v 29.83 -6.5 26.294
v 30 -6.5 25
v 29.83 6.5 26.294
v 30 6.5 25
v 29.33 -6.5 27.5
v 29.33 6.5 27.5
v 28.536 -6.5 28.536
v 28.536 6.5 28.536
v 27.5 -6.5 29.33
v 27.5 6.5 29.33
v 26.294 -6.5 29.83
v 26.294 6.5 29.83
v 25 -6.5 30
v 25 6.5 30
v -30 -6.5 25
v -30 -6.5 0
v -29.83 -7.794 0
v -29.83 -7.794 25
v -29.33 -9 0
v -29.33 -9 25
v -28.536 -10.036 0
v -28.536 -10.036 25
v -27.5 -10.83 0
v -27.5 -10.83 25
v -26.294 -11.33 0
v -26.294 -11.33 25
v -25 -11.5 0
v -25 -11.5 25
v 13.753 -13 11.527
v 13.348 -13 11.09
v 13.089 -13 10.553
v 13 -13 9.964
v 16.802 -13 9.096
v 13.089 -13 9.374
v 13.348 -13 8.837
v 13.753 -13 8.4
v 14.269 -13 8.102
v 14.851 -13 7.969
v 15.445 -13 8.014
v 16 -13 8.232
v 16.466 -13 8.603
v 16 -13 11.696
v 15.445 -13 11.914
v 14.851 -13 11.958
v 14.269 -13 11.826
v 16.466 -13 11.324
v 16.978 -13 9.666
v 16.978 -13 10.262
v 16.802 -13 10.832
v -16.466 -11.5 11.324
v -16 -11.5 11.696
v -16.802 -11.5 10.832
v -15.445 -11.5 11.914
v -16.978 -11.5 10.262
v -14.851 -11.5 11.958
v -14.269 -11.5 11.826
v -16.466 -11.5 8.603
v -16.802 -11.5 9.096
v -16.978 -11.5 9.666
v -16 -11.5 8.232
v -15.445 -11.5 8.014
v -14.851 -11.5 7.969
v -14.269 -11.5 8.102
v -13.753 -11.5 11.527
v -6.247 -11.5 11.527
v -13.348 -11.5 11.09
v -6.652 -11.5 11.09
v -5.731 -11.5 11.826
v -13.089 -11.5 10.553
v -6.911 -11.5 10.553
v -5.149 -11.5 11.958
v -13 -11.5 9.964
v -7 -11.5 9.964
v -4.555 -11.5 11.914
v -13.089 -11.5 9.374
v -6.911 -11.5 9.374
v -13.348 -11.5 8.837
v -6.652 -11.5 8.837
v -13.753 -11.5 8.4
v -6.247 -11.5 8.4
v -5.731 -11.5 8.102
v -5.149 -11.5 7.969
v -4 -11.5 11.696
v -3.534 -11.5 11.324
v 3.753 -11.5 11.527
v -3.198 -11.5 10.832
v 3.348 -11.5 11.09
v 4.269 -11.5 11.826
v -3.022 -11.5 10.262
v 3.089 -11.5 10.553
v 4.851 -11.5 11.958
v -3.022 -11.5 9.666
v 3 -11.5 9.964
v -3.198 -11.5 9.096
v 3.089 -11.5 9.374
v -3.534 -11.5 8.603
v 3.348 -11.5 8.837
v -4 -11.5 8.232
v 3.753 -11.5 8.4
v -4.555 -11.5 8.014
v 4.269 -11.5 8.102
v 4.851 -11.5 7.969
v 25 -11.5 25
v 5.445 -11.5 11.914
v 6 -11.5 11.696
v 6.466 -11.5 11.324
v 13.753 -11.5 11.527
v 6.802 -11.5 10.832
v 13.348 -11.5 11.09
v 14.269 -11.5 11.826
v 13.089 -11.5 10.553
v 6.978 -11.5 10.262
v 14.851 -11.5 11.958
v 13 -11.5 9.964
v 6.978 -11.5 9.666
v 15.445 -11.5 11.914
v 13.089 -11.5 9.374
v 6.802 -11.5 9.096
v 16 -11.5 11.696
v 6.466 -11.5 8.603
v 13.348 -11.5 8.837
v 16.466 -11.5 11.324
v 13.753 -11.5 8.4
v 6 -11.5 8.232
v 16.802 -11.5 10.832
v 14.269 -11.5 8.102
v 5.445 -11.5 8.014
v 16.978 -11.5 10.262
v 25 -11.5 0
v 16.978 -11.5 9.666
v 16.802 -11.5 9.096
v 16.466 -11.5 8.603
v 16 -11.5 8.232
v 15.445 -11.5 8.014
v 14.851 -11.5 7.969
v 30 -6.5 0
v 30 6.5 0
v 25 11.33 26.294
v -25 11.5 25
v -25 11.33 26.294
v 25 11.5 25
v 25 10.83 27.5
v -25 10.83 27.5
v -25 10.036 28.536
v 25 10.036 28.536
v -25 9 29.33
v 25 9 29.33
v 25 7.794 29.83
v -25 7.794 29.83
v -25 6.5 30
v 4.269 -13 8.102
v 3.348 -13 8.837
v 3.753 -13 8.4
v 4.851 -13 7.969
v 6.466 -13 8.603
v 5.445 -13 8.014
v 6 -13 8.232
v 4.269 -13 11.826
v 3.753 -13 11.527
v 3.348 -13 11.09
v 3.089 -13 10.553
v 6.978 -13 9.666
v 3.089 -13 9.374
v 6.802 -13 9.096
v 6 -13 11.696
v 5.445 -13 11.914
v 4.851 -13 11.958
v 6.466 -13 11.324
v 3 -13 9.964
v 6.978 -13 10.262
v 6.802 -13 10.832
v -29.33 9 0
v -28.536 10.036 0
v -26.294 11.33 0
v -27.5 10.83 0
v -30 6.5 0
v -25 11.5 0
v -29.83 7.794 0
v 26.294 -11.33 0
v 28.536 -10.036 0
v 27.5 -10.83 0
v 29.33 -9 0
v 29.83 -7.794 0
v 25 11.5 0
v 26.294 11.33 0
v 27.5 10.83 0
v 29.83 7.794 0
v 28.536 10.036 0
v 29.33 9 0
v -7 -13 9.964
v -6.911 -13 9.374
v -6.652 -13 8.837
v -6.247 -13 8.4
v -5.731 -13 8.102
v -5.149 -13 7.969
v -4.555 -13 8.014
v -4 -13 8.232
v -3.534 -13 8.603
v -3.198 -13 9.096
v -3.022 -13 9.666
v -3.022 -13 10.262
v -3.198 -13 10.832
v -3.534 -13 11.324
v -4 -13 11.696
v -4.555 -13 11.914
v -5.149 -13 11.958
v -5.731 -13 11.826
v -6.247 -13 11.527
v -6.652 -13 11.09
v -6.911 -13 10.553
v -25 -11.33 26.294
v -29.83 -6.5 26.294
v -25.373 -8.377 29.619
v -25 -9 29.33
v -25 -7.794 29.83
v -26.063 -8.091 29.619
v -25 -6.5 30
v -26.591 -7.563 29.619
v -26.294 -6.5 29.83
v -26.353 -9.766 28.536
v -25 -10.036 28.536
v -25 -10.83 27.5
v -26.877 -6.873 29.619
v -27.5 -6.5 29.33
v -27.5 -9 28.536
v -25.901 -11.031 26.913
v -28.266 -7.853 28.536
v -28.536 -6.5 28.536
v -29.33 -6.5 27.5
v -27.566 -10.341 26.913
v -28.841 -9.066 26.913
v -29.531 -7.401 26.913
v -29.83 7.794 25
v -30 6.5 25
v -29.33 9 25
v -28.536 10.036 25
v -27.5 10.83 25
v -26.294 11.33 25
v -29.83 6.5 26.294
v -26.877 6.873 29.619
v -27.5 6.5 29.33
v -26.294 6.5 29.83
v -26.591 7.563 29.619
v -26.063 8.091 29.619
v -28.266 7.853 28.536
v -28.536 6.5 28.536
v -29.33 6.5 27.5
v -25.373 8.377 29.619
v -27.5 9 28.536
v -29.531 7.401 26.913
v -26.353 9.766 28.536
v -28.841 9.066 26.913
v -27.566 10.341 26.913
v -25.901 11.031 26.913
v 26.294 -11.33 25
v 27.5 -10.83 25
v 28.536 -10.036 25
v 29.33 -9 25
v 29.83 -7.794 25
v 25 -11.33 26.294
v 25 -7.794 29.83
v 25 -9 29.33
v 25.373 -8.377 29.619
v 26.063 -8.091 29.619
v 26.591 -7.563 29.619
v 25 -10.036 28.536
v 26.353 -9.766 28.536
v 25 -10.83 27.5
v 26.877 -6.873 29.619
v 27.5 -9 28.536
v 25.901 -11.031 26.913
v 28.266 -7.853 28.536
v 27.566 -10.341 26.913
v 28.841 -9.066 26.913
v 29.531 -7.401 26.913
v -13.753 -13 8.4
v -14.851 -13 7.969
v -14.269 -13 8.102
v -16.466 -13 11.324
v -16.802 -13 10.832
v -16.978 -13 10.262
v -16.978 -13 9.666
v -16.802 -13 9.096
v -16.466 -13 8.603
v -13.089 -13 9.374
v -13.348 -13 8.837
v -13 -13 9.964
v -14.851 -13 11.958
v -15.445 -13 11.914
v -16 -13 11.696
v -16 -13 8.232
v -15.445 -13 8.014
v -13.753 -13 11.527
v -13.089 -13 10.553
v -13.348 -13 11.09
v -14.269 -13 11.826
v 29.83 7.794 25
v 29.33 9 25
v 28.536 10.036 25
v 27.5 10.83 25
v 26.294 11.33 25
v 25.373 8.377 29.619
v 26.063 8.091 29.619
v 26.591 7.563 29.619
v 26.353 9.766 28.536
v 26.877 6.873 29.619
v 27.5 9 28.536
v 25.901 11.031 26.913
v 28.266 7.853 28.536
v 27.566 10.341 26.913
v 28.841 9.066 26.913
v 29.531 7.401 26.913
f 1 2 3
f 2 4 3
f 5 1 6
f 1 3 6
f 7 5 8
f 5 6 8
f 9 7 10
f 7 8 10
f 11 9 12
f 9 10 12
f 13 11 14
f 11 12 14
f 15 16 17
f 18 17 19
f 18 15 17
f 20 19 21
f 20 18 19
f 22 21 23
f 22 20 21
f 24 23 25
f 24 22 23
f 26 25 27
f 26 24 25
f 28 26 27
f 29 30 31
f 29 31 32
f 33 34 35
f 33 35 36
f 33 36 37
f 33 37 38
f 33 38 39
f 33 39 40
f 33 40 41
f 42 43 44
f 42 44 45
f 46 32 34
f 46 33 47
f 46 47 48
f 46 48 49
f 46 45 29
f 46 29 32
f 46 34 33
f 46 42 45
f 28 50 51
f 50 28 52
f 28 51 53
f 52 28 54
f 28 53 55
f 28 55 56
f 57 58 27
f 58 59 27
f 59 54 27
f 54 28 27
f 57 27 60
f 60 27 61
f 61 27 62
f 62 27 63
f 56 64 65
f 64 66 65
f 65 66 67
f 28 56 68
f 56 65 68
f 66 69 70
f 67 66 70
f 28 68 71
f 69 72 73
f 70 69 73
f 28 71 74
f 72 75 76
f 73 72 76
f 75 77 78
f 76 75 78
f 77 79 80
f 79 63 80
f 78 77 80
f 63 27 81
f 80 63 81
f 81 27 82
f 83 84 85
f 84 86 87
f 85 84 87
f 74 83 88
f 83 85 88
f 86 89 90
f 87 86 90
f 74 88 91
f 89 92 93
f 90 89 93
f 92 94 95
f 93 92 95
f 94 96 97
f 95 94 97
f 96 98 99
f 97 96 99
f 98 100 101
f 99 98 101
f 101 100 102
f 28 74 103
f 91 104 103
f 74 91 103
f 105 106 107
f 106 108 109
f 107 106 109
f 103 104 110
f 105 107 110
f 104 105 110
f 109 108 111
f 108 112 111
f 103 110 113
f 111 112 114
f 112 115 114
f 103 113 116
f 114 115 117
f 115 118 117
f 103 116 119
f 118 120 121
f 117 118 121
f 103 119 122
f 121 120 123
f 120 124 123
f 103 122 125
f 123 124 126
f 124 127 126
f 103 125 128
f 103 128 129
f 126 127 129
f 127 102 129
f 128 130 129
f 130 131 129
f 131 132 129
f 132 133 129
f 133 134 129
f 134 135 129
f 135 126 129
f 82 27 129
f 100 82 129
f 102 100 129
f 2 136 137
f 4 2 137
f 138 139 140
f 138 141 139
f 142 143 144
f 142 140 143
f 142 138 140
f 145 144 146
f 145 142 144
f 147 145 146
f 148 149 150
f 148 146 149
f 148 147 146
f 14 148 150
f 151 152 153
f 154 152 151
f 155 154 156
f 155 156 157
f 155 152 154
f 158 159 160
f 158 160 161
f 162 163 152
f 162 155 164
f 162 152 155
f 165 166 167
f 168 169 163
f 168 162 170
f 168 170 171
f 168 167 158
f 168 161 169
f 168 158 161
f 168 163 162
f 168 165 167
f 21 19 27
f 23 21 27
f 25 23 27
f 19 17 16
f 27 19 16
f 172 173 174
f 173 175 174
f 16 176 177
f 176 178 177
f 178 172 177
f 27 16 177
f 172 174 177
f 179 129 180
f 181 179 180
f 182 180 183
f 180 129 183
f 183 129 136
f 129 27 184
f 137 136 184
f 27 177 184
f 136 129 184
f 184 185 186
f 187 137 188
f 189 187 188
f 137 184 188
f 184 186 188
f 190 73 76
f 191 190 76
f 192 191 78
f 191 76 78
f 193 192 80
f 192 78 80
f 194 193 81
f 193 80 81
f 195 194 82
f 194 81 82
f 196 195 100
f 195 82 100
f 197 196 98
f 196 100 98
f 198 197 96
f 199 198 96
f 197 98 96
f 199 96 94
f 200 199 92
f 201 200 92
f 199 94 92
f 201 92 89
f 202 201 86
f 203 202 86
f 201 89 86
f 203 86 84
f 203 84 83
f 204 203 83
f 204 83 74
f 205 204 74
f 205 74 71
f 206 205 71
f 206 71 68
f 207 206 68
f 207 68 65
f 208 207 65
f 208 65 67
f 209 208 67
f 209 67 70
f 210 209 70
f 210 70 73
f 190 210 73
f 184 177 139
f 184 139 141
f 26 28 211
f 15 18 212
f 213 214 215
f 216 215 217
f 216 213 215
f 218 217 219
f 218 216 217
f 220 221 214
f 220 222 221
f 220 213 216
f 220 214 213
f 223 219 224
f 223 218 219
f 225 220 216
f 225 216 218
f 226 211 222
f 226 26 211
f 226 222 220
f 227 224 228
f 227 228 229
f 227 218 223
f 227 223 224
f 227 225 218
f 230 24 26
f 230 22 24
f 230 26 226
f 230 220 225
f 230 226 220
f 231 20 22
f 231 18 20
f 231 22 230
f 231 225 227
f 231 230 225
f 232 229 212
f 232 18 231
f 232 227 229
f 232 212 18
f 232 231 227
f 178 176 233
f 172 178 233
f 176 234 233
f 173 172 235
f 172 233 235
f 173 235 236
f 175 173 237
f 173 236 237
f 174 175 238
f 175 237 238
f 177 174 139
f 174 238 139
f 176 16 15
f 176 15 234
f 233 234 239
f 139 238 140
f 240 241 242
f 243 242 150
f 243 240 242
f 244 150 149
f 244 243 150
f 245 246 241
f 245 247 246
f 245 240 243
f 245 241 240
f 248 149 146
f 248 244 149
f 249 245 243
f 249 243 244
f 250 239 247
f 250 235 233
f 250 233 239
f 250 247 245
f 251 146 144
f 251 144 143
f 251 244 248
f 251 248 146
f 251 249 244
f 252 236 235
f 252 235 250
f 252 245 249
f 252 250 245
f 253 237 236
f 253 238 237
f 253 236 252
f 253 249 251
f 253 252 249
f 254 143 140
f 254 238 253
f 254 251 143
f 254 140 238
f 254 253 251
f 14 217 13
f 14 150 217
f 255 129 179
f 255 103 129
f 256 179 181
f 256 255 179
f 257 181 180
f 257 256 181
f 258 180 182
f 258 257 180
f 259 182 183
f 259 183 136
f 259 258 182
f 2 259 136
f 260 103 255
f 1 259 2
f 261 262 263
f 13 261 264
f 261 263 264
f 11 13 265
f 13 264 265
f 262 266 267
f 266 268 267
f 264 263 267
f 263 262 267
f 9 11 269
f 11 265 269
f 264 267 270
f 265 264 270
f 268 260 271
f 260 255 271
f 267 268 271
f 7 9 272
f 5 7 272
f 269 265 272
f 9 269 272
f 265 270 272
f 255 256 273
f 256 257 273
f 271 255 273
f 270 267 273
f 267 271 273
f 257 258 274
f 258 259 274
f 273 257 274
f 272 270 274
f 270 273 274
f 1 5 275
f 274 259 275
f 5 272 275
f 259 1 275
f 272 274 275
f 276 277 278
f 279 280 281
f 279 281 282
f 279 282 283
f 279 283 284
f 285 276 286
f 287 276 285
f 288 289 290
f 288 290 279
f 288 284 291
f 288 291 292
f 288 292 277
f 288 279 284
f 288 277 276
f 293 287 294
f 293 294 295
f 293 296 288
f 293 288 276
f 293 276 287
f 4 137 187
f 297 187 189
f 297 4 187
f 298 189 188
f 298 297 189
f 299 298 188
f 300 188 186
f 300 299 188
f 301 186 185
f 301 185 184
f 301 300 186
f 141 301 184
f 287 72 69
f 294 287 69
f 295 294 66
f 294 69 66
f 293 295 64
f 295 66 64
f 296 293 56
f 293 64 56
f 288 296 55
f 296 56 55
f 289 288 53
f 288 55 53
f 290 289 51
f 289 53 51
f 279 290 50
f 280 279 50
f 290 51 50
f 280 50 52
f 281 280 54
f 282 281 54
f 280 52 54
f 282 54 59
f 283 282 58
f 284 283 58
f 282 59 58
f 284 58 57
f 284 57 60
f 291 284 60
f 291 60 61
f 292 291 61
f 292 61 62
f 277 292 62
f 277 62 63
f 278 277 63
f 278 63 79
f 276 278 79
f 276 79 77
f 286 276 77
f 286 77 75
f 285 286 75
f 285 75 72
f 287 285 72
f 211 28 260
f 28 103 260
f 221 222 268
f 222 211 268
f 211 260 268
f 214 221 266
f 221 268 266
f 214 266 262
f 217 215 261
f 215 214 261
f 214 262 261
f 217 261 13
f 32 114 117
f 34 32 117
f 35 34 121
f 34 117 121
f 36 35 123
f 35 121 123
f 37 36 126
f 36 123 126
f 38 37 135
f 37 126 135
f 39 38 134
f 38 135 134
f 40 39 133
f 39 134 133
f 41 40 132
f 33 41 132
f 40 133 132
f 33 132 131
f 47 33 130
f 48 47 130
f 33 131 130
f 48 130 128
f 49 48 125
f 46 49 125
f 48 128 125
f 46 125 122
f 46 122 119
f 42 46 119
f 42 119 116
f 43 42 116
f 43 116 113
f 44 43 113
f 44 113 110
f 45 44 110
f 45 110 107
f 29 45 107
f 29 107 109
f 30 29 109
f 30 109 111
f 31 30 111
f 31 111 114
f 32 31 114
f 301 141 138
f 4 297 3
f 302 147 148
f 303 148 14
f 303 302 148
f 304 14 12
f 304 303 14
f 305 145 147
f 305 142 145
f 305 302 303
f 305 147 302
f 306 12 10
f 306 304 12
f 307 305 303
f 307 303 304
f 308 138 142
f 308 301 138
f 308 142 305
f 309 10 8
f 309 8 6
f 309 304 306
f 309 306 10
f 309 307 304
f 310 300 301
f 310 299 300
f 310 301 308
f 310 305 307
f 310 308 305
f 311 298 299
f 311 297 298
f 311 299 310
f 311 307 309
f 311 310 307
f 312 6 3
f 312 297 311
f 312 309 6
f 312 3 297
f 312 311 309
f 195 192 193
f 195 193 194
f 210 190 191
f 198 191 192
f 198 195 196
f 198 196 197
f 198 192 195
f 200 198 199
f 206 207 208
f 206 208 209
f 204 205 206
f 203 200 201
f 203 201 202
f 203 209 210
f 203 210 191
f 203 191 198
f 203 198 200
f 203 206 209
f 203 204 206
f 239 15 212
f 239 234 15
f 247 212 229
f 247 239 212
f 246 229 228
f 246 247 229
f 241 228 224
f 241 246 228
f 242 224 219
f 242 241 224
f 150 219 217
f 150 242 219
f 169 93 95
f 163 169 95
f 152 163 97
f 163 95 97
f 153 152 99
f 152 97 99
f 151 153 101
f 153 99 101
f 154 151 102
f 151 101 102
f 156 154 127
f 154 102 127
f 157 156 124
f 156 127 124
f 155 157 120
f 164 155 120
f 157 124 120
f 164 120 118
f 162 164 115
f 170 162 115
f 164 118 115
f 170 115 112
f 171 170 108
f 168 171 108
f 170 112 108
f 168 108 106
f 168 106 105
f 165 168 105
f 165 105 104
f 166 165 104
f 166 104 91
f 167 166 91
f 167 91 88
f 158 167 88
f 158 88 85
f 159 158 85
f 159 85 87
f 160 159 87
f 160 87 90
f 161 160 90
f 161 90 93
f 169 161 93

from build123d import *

# Parameters (mm, degrees)
F0_W     = 60
F0_H     = 23
F1_DEPTH = 30
F2_R     = 5
F3_R     = 2
F4_DEPTH = 13


with BuildPart() as f1:
    # F0 (on Top) → F1 (new body)
    with BuildSketch(Plane.XY):
        Rectangle(F0_W, F0_H)
    extrude(amount=F1_DEPTH)

    # F2
    f2_edges = [f1.edges().sort_by_distance(p)[0] for p in [
        (-30, 11.5, 15),
        (-30, -11.5, 15),
        (30, -11.5, 15),
        (30, 11.5, 15),
        (0, -11.5, 30),
        (-30, 0, 30),
        (0, 11.5, 30),
        (30, 0, 30),
    ]]
    fillet(f2_edges, radius=F2_R)

    # F3 (on Front) → F4 (join)
    with BuildSketch(Plane.XZ):
        with Locations((-15, 9.963796)):
            Circle(F3_R)
        with BuildLine():
            ThreePointArc((17, 9.963796), (15, 11.963796), (13, 9.963796))
            ThreePointArc((13, 9.963796), (15, 7.963796), (17, 9.963796))
        make_face()
        with BuildLine():
            ThreePointArc((7, 9.963796), (5, 11.963796), (3, 9.963796))
            Line((3, 9.963796), (7, 9.963796))
        make_face()
        with BuildLine():
            Line((7, 9.963796), (3, 9.963796))
            ThreePointArc((3, 9.963796), (5, 7.963796), (7, 9.963796))
        make_face()
        with BuildLine():
            ThreePointArc((-3, 9.963796), (-5, 11.963796), (-7, 9.963796))
            Line((-7, 9.963796), (-3, 9.963796))
        make_face()
        with BuildLine():
            Line((-3, 9.963796), (-7, 9.963796))
            ThreePointArc((-7, 9.963796), (-5, 7.963796), (-3, 9.963796))
        make_face()
    extrude(amount=F4_DEPTH)


solid = f1.part
